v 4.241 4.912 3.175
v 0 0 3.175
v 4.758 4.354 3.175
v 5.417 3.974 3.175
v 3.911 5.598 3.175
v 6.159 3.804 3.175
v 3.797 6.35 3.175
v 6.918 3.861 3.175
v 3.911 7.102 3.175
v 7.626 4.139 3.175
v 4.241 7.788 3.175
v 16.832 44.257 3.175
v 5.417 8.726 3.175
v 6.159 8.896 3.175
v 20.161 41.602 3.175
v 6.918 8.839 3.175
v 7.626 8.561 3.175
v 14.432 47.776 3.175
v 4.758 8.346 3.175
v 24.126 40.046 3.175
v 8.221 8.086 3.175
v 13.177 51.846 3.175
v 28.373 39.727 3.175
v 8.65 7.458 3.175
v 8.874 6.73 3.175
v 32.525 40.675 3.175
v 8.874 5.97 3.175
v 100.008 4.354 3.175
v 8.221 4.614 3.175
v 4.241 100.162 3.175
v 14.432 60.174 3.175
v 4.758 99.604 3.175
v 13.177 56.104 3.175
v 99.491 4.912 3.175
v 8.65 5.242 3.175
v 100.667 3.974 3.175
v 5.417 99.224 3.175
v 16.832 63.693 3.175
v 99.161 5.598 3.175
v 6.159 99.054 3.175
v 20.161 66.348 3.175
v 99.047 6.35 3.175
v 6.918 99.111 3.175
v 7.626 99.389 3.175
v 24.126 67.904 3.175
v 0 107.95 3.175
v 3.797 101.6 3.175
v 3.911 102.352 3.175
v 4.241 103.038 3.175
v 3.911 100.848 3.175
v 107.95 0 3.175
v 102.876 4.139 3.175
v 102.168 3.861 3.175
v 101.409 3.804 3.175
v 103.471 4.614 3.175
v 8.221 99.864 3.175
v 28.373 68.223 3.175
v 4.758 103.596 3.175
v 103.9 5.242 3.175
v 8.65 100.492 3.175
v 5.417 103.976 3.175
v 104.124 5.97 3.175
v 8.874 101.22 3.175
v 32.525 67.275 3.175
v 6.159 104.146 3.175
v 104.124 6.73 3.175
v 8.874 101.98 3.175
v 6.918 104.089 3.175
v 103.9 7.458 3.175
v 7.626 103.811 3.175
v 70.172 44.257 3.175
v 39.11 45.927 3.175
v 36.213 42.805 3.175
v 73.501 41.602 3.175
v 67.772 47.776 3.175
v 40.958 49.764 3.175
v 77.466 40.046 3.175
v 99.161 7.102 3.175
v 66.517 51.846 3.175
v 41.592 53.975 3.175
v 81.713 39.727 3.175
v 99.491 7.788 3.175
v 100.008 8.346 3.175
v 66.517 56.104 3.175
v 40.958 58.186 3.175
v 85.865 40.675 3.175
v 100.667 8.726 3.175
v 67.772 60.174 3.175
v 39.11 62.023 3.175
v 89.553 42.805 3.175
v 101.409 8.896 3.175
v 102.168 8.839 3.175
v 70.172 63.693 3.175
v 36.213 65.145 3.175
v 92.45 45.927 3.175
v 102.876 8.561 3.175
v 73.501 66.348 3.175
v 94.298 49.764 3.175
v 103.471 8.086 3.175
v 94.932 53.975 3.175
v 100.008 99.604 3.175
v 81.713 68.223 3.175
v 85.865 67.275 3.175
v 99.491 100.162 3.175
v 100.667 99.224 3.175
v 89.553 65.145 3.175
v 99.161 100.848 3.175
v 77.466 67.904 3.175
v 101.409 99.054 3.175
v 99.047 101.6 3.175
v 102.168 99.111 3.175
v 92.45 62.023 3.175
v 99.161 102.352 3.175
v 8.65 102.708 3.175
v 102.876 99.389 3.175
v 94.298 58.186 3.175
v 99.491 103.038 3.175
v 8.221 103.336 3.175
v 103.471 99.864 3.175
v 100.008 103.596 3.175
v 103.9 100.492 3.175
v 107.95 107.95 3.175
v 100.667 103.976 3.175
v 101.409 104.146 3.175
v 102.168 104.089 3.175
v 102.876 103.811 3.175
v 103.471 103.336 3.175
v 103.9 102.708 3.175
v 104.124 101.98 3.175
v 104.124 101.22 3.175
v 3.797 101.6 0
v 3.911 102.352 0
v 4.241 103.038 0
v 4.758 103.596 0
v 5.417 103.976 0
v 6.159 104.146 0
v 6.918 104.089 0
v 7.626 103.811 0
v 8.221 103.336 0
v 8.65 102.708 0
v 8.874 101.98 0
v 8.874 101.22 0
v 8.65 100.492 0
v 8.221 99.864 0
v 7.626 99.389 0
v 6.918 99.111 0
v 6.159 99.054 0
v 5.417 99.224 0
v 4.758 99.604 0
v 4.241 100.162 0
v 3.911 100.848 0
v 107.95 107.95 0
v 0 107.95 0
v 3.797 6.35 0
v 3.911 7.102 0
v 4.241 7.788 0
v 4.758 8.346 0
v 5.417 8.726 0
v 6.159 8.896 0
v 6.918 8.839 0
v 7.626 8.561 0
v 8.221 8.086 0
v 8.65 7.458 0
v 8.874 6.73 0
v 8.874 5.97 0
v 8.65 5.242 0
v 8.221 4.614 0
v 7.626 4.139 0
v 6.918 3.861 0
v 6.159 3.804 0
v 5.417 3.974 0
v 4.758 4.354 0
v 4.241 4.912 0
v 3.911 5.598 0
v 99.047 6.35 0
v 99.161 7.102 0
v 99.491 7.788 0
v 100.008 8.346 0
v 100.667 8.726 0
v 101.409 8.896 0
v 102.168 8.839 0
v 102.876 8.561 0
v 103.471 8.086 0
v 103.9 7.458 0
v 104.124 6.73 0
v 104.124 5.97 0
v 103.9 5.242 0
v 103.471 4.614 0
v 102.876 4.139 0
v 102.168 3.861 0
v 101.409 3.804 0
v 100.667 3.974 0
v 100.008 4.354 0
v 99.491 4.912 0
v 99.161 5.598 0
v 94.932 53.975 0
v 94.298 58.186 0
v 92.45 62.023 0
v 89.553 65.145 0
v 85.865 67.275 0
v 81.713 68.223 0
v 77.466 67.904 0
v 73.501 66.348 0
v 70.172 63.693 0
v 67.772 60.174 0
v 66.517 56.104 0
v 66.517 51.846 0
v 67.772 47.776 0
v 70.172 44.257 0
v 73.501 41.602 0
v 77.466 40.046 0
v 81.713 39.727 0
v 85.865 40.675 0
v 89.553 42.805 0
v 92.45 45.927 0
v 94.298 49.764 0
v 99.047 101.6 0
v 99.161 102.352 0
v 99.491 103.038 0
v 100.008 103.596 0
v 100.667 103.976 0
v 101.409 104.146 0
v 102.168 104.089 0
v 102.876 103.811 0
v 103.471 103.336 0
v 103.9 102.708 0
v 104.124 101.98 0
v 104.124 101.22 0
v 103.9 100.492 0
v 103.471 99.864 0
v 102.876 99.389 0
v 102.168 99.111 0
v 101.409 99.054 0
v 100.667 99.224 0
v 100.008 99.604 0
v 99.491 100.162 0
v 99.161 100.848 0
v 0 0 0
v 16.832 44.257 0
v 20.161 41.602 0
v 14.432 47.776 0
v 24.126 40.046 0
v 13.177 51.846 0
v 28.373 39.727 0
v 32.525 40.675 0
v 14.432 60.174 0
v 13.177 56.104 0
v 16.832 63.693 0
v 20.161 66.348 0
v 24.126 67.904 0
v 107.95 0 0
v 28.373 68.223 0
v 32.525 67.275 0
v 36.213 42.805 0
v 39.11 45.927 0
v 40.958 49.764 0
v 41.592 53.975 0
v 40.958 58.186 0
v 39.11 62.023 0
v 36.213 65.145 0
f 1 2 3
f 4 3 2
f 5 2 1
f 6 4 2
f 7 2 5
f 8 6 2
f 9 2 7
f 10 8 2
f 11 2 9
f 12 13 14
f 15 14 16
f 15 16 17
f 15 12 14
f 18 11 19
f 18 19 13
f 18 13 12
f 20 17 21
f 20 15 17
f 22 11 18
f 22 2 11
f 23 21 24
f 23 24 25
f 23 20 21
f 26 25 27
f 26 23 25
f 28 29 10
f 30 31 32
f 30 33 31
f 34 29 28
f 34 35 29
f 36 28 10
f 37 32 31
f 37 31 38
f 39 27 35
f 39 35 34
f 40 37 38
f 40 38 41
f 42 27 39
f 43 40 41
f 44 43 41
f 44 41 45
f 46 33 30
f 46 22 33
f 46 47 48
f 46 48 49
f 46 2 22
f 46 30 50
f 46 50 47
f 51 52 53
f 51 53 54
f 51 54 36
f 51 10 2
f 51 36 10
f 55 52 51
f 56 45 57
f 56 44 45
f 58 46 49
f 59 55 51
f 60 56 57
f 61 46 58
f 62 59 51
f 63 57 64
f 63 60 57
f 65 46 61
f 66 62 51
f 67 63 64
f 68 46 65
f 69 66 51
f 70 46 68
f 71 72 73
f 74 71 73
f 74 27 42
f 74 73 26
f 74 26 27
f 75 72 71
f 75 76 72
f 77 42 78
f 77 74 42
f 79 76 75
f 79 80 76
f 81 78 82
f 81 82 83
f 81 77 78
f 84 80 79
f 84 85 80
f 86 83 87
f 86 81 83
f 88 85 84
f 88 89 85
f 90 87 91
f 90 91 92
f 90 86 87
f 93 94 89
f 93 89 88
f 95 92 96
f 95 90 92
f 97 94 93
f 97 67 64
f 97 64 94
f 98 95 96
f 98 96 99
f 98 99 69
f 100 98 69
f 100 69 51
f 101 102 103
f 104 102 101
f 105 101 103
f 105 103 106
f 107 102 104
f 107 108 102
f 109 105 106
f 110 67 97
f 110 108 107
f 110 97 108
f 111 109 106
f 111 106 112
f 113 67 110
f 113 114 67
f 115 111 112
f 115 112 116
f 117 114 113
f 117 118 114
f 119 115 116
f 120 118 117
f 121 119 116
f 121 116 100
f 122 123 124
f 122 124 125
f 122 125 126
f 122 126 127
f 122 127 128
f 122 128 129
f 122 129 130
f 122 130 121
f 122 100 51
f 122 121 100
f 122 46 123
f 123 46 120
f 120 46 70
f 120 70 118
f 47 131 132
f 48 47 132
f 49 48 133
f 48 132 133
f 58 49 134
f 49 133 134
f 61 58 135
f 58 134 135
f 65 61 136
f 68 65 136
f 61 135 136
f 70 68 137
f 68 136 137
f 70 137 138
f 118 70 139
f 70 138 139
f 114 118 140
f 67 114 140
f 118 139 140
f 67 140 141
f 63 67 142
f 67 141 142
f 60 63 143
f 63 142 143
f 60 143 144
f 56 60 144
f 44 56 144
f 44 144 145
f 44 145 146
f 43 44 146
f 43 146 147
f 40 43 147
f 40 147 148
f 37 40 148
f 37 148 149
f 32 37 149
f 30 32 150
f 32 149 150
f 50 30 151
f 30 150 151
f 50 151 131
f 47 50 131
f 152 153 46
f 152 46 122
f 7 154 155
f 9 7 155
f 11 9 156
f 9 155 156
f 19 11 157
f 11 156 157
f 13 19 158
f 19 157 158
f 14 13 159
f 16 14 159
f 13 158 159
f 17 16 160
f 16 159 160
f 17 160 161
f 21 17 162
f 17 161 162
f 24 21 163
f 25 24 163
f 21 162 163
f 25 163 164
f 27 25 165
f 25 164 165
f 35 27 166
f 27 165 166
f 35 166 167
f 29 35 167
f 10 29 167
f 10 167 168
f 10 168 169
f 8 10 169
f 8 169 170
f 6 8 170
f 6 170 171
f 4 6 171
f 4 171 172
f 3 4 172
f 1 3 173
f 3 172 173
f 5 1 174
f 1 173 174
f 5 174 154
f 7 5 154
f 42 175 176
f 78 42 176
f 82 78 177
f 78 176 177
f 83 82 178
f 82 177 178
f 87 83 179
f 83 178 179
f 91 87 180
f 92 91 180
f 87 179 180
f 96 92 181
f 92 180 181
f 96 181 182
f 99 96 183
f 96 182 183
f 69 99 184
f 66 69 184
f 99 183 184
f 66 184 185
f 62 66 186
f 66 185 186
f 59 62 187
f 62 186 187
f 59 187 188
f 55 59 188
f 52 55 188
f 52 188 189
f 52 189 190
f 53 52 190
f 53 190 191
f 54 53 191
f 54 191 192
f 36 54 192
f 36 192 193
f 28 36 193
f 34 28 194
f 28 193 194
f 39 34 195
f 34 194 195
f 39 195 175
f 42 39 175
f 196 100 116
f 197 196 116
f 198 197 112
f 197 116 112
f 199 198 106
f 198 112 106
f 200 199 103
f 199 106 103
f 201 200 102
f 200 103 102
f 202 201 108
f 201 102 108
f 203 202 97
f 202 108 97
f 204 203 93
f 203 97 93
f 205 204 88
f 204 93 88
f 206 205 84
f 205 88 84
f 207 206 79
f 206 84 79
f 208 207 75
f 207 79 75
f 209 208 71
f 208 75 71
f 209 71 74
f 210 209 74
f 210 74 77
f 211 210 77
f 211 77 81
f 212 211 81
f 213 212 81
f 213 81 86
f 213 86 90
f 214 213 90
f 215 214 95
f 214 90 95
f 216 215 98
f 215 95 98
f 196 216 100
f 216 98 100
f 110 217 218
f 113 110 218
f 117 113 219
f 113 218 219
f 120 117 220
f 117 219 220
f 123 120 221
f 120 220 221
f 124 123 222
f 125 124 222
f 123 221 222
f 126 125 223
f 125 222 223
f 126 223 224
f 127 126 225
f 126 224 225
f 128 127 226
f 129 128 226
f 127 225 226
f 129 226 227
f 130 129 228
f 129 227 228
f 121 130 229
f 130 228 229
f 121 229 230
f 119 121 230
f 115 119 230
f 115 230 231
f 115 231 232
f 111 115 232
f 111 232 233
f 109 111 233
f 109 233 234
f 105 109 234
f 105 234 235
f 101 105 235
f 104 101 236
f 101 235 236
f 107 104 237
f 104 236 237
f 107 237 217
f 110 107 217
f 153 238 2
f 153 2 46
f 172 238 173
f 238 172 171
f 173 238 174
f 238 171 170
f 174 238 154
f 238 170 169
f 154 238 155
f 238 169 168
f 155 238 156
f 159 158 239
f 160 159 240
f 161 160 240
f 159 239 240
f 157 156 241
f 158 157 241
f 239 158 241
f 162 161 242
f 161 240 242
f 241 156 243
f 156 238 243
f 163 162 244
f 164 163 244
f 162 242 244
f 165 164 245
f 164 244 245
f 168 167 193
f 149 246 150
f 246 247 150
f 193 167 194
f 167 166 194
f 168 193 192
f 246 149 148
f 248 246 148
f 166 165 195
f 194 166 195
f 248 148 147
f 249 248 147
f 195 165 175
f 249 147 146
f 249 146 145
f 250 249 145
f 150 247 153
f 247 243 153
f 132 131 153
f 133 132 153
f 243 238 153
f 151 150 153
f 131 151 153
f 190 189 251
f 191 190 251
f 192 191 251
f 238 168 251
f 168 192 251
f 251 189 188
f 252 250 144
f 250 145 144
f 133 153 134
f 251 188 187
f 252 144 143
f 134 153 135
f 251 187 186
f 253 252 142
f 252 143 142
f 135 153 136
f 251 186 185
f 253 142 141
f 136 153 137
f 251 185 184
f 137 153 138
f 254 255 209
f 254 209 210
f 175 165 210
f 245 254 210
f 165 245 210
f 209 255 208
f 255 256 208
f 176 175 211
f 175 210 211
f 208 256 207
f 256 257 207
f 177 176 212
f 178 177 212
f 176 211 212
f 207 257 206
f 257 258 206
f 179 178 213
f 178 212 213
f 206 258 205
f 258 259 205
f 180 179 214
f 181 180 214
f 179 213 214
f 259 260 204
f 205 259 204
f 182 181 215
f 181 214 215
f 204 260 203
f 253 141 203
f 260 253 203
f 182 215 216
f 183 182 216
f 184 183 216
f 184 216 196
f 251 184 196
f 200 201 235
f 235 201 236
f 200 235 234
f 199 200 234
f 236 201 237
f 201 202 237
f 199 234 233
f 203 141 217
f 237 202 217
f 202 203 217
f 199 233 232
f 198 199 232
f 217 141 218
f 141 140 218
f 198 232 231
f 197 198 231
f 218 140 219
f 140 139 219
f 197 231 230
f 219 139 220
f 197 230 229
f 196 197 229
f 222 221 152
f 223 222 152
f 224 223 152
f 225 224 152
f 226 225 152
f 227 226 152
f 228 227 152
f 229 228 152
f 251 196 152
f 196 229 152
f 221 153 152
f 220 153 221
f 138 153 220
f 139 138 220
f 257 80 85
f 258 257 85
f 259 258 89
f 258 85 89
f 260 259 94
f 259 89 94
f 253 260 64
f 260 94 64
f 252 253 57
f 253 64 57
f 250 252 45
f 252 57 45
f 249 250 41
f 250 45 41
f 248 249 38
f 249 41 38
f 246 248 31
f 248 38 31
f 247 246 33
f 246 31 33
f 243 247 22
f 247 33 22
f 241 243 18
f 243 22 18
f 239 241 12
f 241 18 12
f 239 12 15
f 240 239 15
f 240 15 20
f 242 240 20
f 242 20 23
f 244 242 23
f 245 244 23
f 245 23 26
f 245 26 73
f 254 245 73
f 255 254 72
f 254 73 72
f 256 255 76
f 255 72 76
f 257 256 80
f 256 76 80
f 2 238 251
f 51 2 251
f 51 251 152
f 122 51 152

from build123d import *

# Parameters (mm, degrees)
SKETCH1_W           = 107.95
SKETCH1_H           = 107.95
BOSS_EXTRUDE1_DEPTH = 3.175
SKETCH2_R           = 2.5527
CUT_EXTRUDE1_DEPTH  = 3.175
SKETCH3_R           = 14.2875
CUT_EXTRUDE2_DEPTH  = 3.175


with BuildPart() as part:
    # Sketch1 → Boss-Extrude1 (new body)
    with BuildSketch(Plane.XY):
        with Locations((53.975, 53.975)):
            Rectangle(SKETCH1_W, SKETCH1_H)
    extrude(amount=BOSS_EXTRUDE1_DEPTH)

    # Sketch2 → Cut-Extrude1 (cut)
    with BuildSketch(Plane(origin=(0, 0, 0), x_dir=(-1, 0, 0), z_dir=(0, 0, -1))):
        with Locations((-6.35, 101.6)):
            Circle(SKETCH2_R)
        with Locations((-101.6, 101.6)):
            Circle(SKETCH2_R)
        with Locations((-101.6, 6.35)):
            Circle(SKETCH2_R)
        with Locations((-6.35, 6.35)):
            Circle(SKETCH2_R)
    extrude(amount=-CUT_EXTRUDE1_DEPTH, mode=Mode.SUBTRACT)

    # Sketch3 → Cut-Extrude2 (cut)
    with BuildSketch(Plane.XY.offset(3.175)):
        with Locations((27.305, 53.975)):
            Circle(SKETCH3_R)
        with Locations((80.645, 53.975)):
            Circle(SKETCH3_R)
    extrude(amount=-CUT_EXTRUDE2_DEPTH, mode=Mode.SUBTRACT)


solid = part.part
